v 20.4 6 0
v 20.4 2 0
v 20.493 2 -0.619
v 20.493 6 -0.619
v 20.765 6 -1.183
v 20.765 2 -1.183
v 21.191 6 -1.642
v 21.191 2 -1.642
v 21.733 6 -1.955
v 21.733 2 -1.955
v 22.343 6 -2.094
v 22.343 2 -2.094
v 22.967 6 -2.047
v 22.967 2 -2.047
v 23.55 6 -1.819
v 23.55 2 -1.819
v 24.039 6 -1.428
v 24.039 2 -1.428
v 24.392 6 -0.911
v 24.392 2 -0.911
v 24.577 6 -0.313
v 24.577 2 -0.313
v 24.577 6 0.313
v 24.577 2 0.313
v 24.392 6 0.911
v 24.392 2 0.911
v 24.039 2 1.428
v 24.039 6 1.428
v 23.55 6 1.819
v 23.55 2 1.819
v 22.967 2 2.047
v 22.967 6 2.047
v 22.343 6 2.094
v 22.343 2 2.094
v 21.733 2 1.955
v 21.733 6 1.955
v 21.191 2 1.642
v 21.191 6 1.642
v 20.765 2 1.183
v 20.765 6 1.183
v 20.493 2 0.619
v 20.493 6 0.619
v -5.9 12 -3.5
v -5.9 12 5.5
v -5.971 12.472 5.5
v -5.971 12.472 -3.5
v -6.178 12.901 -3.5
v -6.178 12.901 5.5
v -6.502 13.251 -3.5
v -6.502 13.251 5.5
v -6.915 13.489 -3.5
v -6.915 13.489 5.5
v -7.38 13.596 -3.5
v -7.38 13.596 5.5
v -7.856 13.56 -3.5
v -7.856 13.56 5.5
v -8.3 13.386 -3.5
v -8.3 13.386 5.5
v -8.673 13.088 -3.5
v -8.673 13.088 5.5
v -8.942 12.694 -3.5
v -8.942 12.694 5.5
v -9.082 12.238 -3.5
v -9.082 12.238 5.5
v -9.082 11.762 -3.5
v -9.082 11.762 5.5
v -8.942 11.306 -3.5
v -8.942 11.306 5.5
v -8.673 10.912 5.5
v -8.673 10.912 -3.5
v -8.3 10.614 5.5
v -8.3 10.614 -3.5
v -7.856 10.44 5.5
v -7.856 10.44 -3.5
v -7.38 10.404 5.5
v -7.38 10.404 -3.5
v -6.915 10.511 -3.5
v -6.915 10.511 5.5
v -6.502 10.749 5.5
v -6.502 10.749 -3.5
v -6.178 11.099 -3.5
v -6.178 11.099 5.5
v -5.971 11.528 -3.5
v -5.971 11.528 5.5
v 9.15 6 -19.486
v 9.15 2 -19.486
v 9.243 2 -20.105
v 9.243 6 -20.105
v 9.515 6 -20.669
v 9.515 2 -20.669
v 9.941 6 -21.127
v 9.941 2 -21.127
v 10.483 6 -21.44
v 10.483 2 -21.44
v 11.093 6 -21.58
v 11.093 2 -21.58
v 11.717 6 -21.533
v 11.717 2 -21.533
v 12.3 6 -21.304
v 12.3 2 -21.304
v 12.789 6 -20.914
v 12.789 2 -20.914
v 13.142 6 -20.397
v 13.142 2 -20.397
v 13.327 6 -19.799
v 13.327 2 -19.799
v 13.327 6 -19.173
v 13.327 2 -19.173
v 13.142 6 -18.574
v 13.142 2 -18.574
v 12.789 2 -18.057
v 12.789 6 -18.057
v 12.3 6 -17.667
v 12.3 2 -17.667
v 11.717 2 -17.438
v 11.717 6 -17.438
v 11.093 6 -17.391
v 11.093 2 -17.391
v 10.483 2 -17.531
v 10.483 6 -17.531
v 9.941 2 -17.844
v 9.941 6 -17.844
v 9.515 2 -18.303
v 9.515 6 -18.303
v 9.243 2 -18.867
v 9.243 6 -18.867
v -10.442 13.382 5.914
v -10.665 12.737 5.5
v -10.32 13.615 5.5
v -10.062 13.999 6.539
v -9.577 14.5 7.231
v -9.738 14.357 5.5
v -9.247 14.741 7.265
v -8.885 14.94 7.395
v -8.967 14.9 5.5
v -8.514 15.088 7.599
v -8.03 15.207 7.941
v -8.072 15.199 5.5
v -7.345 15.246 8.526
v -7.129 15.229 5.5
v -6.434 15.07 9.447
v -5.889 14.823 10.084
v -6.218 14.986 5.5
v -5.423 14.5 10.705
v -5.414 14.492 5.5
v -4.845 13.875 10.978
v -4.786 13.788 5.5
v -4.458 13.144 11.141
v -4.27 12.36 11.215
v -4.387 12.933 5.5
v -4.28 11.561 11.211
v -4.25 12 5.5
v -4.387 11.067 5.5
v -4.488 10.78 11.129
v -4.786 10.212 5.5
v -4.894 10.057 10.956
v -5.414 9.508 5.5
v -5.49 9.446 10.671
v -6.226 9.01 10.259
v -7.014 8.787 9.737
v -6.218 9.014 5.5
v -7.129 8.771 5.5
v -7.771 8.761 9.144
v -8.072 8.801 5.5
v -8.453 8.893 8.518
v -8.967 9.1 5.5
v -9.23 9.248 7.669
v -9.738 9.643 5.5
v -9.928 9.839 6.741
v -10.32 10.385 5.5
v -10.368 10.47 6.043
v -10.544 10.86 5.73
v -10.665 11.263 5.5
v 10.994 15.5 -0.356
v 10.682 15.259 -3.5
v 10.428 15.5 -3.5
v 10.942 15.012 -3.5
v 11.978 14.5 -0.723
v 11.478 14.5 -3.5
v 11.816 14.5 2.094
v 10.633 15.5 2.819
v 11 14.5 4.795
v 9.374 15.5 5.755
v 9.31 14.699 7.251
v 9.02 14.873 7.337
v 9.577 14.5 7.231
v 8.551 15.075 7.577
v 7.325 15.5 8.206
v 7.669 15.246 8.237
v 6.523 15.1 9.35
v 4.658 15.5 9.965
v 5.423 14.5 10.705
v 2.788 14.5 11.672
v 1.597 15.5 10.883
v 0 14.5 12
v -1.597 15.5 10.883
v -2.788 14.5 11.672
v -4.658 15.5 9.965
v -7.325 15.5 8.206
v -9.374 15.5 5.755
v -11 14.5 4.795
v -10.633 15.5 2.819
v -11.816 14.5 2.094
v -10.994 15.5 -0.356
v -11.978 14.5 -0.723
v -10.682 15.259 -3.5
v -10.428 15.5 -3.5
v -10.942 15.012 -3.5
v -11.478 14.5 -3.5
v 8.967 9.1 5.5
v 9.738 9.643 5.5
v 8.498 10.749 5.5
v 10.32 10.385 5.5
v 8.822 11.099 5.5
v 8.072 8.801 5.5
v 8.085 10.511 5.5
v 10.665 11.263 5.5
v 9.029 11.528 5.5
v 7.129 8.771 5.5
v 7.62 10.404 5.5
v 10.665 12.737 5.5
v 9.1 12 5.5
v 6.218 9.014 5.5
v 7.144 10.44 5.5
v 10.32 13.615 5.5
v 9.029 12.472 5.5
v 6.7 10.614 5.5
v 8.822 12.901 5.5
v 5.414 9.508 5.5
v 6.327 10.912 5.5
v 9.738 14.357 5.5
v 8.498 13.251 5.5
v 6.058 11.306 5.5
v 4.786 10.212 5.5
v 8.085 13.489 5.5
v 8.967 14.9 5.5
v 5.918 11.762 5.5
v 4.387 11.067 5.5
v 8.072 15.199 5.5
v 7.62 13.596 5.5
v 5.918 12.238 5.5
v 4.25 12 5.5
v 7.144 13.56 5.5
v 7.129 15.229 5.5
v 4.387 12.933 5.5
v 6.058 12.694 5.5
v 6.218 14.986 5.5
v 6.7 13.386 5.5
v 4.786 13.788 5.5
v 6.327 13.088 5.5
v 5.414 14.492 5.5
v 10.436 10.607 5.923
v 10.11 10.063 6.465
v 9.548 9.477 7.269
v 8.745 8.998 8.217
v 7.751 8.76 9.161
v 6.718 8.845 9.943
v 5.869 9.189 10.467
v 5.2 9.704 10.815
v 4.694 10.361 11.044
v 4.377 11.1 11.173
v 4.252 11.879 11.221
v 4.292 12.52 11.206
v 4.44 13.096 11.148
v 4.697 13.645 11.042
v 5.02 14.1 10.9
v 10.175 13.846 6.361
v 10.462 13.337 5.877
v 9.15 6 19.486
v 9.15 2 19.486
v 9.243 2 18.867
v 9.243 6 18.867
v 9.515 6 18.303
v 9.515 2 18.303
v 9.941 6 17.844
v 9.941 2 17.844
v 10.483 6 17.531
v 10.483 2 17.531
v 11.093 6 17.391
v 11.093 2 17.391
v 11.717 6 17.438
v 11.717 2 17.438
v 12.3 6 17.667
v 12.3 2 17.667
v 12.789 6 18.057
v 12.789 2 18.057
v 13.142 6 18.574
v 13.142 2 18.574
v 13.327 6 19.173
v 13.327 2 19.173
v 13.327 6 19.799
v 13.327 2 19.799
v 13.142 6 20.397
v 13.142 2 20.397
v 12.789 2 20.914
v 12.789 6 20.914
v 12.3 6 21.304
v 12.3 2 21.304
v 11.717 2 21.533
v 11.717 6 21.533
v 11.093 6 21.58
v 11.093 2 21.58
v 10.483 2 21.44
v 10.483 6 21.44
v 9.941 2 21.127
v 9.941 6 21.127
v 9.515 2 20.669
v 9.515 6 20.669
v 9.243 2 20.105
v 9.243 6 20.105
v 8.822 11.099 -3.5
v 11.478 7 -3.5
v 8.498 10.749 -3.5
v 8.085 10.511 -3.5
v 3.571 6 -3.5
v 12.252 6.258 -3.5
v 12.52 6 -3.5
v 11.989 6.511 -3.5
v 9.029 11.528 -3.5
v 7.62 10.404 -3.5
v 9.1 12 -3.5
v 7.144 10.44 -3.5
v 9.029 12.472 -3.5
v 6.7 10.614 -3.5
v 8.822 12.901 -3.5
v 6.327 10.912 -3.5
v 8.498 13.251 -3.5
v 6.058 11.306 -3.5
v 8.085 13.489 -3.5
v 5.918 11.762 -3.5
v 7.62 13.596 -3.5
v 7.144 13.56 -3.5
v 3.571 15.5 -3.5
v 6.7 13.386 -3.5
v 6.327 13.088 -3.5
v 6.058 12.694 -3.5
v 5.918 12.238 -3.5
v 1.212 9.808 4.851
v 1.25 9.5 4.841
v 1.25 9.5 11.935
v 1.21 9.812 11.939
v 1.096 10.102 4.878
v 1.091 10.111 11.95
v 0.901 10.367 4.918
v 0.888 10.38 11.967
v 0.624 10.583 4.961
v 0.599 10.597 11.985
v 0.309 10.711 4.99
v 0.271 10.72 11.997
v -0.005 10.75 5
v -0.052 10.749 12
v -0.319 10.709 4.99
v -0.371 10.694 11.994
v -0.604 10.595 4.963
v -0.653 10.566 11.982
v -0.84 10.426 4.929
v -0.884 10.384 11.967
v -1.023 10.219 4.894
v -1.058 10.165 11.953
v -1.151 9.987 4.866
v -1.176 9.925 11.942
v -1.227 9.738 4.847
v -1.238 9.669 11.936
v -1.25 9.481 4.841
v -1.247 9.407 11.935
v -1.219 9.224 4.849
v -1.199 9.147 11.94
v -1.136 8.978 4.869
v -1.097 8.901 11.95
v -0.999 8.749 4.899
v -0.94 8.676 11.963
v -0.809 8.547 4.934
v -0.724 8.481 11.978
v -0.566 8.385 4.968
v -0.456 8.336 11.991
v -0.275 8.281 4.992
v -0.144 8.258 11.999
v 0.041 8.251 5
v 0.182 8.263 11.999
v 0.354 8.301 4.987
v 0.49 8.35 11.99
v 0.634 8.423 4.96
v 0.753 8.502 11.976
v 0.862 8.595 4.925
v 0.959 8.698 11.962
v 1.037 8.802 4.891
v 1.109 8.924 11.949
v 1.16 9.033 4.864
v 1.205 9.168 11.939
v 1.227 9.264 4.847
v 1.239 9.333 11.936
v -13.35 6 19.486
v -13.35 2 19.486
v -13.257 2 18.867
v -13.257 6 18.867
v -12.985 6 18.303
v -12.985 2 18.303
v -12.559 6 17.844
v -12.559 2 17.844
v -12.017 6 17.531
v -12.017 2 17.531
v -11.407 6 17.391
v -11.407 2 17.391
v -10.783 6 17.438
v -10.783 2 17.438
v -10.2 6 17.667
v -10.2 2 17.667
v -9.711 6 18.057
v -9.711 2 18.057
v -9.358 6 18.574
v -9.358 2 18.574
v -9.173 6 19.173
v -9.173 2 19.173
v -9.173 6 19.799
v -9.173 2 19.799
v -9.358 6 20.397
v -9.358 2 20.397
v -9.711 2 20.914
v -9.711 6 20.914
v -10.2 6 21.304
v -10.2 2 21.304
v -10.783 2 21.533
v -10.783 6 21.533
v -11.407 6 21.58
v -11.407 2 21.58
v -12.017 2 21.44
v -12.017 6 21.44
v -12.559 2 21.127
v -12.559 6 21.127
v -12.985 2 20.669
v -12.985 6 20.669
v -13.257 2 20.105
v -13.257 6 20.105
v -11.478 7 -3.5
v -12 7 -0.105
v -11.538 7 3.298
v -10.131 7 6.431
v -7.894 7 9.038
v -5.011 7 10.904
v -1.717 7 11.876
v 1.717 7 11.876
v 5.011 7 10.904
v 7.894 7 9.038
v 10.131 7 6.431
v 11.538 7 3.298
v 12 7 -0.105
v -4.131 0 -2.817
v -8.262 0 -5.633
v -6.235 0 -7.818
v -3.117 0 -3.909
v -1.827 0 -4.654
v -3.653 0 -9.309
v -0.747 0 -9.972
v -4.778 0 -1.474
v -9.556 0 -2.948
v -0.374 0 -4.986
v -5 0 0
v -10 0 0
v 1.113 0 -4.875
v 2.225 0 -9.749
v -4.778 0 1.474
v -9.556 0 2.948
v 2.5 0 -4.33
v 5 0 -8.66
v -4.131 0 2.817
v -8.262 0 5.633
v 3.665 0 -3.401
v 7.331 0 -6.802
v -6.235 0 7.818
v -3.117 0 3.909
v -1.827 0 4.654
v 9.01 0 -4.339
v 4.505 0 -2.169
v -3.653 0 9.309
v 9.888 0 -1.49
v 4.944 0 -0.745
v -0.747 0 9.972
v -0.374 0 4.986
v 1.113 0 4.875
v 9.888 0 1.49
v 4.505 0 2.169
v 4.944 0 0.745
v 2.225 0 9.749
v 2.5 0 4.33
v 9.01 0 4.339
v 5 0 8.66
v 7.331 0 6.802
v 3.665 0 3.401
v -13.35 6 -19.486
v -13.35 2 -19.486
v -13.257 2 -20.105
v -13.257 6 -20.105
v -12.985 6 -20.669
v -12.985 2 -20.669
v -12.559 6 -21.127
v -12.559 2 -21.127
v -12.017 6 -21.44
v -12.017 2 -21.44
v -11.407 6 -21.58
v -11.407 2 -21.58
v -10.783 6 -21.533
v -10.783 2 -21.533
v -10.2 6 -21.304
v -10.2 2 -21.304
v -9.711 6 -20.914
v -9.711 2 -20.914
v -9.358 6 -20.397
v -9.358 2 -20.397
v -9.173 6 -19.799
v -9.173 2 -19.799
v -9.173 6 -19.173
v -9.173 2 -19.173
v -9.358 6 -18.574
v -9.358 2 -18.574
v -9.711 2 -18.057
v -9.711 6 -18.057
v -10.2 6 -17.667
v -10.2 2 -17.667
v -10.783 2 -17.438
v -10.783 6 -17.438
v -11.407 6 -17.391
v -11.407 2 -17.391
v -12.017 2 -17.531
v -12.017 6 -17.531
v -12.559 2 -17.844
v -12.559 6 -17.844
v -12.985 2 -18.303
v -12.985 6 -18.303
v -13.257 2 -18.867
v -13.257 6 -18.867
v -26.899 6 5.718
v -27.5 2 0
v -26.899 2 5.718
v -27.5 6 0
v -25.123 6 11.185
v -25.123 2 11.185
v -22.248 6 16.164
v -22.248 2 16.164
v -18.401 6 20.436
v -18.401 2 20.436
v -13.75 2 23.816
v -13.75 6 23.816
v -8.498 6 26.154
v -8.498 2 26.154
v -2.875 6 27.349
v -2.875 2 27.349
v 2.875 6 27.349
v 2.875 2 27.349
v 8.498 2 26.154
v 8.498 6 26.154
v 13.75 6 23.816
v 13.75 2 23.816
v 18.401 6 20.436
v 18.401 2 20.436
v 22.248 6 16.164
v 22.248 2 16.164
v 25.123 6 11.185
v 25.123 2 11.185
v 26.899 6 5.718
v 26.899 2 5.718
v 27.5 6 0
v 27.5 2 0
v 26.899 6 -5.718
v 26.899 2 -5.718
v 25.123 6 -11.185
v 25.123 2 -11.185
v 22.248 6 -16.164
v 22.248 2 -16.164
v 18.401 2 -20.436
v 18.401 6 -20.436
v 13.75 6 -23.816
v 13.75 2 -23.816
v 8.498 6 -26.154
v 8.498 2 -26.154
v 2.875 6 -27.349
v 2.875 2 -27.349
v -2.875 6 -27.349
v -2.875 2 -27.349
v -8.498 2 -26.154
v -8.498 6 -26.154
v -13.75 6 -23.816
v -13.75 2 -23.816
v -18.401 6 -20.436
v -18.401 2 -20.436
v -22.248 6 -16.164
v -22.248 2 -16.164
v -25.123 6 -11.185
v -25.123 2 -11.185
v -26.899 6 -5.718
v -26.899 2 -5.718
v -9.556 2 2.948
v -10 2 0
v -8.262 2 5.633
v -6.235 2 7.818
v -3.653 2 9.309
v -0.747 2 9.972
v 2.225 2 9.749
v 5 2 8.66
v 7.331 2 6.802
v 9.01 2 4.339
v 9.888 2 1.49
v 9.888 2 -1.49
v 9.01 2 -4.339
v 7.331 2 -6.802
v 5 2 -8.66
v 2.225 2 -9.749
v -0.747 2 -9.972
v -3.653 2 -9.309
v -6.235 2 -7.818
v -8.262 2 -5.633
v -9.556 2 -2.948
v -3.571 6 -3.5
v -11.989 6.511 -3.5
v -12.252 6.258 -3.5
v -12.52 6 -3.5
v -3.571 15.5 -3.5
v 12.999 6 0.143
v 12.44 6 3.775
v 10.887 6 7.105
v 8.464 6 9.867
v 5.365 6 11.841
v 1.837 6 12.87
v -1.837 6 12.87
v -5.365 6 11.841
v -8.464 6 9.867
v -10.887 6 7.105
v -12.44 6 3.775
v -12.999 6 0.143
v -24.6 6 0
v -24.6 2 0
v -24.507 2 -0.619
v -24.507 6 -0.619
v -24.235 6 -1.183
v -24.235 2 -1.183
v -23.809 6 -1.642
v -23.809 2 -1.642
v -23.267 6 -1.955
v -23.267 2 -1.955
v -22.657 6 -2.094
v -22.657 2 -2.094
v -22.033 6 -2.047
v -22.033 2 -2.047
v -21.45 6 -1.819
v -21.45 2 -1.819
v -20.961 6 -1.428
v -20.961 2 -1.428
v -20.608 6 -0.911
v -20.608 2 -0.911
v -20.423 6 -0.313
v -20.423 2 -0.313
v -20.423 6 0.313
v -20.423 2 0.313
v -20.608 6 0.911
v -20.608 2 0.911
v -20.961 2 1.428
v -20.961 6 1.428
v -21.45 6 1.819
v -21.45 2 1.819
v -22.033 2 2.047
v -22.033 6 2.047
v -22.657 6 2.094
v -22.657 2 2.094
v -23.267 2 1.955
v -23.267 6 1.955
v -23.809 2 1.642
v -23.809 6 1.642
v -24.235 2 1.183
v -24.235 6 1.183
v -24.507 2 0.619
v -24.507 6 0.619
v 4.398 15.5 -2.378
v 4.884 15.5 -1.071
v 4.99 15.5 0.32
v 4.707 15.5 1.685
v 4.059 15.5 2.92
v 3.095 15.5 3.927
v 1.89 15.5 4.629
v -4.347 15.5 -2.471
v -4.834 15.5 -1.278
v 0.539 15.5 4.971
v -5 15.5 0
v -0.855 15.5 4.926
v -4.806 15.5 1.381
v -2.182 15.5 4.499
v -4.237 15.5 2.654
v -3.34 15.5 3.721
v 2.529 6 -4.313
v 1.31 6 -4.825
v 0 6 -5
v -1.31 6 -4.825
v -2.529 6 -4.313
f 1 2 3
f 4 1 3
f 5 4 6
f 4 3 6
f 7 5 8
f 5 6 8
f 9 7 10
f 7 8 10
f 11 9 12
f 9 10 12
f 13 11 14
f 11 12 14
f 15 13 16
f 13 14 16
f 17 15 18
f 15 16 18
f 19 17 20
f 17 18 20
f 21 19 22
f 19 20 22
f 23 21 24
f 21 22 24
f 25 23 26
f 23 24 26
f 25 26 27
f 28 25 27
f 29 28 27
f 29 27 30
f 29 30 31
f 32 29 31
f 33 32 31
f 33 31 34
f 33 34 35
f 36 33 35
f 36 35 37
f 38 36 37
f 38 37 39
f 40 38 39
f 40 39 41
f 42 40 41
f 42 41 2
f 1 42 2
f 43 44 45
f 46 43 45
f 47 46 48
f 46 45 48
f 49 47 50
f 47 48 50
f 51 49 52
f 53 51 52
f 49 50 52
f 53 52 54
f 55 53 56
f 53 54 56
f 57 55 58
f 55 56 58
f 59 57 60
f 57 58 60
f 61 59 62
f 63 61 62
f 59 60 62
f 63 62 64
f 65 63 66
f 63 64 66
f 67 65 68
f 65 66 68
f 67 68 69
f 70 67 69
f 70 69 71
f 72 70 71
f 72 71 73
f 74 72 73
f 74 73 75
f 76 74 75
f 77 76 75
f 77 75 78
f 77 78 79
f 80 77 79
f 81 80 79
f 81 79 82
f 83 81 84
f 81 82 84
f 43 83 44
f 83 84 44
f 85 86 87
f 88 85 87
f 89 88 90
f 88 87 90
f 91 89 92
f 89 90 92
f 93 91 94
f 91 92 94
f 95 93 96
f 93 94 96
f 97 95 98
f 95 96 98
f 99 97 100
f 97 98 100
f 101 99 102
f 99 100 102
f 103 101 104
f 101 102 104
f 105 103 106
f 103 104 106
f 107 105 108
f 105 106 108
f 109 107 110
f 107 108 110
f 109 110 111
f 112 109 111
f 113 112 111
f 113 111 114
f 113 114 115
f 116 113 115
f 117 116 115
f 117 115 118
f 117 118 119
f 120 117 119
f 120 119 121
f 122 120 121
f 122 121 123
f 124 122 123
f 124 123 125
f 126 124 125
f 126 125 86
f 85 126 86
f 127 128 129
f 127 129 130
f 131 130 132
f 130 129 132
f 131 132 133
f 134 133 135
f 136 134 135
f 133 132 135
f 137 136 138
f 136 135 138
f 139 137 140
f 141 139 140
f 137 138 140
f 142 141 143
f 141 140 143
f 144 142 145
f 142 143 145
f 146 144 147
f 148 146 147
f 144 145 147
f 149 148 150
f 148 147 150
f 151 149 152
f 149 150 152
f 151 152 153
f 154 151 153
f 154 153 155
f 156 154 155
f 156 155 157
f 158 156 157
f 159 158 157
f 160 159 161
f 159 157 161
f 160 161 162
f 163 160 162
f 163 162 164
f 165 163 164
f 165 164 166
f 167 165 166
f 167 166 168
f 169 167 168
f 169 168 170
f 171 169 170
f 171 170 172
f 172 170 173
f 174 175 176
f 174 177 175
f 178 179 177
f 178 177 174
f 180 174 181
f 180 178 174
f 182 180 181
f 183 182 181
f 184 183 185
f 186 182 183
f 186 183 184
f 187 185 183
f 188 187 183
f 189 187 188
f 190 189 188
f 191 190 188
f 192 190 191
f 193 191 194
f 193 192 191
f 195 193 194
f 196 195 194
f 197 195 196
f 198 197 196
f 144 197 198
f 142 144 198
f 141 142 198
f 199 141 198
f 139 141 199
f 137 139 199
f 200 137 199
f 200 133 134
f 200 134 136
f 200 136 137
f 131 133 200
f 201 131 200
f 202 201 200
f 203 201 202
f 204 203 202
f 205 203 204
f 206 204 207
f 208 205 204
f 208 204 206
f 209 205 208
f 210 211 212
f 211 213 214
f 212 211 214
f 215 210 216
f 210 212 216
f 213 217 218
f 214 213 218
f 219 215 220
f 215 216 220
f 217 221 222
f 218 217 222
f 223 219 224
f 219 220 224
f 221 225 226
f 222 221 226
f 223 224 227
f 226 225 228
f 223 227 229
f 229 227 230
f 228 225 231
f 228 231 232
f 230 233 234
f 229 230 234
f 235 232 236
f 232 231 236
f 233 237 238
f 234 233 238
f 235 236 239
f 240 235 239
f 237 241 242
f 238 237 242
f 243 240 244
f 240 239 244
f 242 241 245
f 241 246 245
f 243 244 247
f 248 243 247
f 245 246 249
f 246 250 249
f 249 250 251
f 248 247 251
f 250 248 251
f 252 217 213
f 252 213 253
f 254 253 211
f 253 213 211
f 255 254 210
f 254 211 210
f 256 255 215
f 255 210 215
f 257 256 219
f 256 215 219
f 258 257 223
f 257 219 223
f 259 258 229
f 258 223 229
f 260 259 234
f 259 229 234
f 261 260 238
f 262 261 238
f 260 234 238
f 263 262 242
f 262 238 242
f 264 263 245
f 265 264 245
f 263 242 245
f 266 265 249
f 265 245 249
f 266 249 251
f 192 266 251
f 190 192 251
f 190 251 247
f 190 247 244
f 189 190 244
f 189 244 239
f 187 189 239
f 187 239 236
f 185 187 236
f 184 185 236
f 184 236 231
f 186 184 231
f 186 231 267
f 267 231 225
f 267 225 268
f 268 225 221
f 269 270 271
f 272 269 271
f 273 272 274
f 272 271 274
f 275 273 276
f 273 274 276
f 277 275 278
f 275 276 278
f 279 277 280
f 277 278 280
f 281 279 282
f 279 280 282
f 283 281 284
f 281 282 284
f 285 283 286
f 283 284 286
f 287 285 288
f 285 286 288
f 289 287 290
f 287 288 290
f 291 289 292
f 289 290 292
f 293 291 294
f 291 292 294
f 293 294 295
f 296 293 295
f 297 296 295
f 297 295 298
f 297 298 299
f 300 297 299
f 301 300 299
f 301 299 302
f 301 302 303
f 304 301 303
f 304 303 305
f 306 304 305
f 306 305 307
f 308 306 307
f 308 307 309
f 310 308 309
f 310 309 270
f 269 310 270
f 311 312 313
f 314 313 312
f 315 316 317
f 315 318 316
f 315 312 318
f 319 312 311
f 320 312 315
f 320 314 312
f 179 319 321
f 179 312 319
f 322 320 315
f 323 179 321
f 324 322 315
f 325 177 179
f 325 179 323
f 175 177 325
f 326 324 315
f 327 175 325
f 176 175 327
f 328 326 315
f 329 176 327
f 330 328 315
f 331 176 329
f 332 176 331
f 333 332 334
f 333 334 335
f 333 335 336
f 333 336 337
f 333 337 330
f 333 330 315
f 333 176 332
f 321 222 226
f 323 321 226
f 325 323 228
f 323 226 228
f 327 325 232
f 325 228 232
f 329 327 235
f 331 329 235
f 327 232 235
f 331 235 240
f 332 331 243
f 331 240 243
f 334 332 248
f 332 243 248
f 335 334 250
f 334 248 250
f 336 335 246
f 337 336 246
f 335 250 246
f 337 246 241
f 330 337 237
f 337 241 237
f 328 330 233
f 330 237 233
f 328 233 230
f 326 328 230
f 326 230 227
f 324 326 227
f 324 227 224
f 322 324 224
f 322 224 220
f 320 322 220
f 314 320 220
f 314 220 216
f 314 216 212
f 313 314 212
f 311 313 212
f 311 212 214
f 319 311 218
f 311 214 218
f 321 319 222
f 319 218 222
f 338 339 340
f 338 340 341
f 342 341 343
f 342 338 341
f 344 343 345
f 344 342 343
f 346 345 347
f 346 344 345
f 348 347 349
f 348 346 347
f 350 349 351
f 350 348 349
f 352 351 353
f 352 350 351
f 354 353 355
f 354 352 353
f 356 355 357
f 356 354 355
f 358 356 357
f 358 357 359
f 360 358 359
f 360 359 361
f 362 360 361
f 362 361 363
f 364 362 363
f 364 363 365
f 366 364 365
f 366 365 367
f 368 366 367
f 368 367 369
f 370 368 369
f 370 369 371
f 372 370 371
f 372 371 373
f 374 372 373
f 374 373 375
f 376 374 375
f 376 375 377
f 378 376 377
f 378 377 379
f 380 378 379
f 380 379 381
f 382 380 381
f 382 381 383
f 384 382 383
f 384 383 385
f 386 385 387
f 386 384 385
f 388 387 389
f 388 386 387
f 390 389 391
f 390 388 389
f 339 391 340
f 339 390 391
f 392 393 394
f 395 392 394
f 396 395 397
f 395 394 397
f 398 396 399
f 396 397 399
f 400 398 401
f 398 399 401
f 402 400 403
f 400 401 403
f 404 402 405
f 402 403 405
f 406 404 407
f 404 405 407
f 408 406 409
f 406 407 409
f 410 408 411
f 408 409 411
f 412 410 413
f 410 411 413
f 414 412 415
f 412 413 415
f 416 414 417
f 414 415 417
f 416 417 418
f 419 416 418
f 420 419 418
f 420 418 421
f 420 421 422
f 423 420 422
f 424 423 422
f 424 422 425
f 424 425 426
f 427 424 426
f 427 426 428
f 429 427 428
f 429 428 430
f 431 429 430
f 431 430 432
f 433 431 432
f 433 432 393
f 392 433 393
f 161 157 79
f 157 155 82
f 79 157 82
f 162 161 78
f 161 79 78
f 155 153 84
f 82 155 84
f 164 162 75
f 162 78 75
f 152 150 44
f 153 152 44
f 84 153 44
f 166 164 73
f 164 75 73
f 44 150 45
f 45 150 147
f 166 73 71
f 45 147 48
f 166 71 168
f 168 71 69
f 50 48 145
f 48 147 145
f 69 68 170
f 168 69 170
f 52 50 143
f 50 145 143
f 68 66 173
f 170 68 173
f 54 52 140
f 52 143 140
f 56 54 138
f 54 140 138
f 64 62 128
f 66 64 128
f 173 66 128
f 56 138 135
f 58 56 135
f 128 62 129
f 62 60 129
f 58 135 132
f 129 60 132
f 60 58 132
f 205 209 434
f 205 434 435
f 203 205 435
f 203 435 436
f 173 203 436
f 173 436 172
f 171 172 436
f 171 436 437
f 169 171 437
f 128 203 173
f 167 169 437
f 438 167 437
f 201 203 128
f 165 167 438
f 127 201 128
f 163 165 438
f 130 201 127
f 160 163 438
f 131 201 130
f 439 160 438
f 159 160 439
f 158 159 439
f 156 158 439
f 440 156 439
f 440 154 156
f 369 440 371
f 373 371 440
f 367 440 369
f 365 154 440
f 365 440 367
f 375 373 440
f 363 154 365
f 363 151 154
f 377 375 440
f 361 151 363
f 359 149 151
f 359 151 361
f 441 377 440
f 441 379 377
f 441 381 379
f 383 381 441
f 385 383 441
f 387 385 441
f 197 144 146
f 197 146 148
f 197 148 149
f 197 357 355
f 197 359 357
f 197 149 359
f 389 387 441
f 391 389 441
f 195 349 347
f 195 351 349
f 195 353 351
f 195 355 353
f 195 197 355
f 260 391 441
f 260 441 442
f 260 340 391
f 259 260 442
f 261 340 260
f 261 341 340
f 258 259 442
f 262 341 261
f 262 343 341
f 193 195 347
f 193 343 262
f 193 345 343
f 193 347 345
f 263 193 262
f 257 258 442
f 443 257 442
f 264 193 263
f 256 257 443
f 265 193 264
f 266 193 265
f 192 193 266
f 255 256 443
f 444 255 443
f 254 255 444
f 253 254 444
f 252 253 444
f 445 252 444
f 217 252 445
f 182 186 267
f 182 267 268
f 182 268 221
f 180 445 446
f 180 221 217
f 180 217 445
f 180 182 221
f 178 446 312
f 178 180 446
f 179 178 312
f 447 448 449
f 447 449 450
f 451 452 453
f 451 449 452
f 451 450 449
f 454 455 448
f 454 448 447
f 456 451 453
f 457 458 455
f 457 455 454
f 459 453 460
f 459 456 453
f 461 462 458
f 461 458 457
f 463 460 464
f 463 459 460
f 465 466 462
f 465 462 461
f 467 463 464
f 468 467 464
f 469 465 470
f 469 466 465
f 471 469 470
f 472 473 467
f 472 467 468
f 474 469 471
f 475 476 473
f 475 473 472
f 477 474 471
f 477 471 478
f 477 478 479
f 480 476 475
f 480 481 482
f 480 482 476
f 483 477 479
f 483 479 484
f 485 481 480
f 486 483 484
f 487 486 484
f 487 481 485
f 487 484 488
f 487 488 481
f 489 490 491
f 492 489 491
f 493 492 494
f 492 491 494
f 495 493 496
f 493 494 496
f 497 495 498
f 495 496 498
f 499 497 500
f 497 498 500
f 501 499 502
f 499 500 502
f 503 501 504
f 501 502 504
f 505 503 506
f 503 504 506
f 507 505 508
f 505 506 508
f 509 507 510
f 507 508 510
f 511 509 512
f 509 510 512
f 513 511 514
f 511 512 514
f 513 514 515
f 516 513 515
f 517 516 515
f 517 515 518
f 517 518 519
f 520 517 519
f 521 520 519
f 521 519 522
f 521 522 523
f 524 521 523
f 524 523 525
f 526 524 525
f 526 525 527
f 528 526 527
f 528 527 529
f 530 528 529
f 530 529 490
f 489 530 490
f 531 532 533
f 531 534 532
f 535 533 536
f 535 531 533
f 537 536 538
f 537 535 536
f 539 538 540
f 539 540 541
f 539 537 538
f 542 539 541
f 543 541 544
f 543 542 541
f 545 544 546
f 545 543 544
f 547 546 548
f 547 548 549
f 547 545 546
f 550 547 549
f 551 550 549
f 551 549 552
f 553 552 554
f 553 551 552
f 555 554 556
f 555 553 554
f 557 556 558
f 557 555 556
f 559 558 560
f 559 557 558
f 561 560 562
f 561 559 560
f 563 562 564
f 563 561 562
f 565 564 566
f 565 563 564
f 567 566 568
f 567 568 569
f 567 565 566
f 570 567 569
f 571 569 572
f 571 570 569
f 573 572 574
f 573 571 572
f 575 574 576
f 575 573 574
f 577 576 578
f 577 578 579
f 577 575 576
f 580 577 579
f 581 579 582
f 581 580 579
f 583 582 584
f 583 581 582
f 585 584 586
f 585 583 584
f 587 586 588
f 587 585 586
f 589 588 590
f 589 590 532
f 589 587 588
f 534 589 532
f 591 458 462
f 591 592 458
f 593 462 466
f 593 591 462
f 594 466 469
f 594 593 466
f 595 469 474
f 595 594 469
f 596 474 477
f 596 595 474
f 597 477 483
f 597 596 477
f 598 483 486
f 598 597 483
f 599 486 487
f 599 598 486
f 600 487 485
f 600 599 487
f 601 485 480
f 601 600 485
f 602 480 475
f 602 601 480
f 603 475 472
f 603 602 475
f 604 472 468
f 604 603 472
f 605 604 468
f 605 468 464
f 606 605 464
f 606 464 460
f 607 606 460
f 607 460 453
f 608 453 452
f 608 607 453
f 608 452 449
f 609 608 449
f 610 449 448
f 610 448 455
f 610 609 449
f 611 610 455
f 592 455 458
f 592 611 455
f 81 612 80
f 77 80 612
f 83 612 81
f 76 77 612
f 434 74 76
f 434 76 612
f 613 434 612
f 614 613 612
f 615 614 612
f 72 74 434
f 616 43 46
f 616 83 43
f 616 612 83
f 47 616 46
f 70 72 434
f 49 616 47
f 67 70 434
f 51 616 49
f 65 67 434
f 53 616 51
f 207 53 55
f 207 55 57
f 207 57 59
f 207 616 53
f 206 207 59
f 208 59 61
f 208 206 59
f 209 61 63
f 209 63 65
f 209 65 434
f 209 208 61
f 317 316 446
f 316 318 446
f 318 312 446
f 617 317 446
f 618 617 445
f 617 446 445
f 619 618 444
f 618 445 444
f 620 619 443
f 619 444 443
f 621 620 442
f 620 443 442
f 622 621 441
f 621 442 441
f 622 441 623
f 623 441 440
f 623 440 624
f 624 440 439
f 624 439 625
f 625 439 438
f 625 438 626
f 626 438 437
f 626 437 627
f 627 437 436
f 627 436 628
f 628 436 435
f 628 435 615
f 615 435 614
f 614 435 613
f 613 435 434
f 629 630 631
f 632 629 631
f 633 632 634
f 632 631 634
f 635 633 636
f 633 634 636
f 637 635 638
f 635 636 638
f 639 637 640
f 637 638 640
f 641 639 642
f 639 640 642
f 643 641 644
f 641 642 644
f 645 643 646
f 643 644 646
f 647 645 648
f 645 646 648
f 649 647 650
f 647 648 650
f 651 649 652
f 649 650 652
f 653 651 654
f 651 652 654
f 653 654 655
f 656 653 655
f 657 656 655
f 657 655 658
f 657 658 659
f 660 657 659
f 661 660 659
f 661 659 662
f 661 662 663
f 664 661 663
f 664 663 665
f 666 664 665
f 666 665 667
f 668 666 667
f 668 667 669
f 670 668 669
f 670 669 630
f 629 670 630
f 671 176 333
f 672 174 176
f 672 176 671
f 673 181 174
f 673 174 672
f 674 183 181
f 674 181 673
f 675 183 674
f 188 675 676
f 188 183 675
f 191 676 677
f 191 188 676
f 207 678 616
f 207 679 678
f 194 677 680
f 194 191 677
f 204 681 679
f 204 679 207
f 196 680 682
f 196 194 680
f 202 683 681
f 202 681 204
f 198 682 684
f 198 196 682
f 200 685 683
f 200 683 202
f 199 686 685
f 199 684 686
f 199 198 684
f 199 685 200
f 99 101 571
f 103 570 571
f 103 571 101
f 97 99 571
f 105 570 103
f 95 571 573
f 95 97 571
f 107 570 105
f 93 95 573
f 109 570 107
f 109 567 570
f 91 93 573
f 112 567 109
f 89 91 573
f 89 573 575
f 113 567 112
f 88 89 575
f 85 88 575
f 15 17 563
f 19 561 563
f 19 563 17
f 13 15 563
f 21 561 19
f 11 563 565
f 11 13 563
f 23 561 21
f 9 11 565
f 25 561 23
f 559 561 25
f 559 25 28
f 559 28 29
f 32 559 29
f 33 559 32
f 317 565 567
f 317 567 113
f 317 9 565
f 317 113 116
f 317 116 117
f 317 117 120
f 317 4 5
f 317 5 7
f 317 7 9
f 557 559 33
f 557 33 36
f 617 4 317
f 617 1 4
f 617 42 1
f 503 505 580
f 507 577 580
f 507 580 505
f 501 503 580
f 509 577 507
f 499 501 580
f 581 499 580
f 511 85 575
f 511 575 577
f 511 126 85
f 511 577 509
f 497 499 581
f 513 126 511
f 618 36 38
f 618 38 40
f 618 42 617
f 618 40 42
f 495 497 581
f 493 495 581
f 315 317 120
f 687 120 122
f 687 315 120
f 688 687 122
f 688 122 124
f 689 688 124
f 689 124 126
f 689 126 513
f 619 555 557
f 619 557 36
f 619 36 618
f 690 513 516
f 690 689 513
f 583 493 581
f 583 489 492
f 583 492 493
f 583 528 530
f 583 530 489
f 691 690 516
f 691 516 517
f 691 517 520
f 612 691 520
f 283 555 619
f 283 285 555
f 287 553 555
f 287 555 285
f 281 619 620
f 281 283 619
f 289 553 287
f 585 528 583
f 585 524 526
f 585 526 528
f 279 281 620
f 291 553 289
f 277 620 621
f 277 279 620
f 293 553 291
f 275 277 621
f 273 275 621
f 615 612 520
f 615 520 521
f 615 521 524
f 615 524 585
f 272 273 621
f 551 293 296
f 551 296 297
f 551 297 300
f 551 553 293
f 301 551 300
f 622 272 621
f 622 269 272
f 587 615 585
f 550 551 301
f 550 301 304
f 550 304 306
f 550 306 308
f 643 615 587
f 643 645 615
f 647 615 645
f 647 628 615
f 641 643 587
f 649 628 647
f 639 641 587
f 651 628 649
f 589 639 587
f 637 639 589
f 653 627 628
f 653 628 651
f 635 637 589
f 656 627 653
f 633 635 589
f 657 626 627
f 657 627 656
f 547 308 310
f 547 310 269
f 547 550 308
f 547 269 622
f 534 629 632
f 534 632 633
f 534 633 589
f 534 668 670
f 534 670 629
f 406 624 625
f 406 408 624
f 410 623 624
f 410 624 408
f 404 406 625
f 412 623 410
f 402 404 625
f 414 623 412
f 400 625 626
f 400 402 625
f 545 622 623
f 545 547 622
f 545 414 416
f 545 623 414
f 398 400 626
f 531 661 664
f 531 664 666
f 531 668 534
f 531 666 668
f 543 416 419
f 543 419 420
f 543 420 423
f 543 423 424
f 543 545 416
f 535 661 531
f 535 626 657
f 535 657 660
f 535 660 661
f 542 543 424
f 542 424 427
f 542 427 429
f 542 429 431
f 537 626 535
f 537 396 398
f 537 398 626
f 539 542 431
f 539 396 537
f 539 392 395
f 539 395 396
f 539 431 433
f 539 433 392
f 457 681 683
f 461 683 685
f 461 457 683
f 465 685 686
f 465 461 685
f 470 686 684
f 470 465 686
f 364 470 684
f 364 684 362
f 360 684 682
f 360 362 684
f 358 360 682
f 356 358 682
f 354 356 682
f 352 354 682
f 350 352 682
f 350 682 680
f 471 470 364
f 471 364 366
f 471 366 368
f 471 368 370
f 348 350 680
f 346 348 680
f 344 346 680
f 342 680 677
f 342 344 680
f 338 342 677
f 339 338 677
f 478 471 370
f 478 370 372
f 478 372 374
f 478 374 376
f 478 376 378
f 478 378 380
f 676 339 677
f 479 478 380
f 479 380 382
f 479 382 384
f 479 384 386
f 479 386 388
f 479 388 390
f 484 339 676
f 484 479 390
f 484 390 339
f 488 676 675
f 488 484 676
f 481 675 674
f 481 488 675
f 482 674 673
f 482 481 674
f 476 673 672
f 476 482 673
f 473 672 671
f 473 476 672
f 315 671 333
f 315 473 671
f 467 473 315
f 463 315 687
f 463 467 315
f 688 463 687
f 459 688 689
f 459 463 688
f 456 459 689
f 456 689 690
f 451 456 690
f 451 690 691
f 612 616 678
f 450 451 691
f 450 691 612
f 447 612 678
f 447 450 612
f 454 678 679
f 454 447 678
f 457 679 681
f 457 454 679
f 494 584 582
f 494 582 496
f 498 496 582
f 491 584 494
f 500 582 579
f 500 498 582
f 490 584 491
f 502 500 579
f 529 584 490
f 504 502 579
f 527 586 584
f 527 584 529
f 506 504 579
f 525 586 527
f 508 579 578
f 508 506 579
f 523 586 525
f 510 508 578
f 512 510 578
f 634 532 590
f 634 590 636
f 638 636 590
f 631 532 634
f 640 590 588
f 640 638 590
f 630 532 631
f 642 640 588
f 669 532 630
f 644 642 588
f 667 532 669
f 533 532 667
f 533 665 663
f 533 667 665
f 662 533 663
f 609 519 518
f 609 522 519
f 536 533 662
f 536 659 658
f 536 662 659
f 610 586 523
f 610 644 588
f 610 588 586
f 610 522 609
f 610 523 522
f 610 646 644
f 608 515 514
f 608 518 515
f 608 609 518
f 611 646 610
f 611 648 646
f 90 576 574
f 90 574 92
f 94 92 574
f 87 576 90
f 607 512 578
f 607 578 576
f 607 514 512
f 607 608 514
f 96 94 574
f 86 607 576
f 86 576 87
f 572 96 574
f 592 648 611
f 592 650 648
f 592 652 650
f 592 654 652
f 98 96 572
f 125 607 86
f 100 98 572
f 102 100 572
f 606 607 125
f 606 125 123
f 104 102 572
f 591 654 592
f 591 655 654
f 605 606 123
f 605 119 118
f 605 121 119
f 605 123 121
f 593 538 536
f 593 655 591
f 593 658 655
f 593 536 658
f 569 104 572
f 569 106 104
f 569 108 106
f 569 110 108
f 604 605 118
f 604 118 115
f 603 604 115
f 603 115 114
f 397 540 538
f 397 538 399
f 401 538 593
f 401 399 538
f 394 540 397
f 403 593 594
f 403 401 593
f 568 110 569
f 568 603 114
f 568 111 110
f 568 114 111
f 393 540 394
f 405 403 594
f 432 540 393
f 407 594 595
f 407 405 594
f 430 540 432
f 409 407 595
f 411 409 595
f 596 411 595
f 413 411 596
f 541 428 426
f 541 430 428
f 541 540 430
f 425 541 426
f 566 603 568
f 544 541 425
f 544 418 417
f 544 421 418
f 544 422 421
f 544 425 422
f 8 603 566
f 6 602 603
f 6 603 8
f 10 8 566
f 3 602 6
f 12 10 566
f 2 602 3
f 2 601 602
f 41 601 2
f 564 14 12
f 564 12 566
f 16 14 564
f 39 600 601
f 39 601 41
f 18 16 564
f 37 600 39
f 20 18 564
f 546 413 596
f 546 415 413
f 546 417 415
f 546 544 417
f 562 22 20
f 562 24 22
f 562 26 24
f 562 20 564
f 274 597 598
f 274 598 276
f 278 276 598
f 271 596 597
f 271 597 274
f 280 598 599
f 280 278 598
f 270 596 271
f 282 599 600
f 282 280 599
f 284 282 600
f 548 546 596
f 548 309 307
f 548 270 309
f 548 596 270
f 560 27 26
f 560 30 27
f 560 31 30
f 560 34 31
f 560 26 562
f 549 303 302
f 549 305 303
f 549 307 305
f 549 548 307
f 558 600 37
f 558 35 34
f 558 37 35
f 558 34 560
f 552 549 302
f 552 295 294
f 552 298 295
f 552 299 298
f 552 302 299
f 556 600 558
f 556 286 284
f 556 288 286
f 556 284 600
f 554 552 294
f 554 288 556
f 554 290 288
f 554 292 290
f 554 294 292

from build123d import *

# Parameters (mm, degrees)
SKETCH_2_R               = 1
CUT_EXTRUDE_2_DEPTH      = 10
CUT_EXTRUDE_4_DEPTH      = 9.5
CHAMFER_1_SIZE           = 1
SKETCH_3_R               = 1.25
SKETCH_3_R_2             = 1.6
CUT_EXTRUDE_3_DEPTH      = 28.5
CUT_EXTRUDE_3_DEPTH_BACK = 28.5
SKETCH_7_R               = 3.25
CUT_EXTRUDE_5_DEPTH      = 23
HOLE_WIZARD_M5_1_D       = 4.2


with BuildPart() as part:
    # 草图1 → 旋转1 (revolve)
    with BuildSketch(Plane.XY):
        Polygon((-10, 2), (-27.5, 2), (-27.5, 6), (-12, 6), (-12, 15.5), (-5, 15.5), (-5, 0), (-10, 0), align=None)
    revolve(axis=Axis((0, 0, 0), (0, 1, 0)))

    # 草图2 → 切除-拉伸2 (cut)
    with BuildSketch(Plane.XZ.offset(-2)):
        with Locations((-11.25, 19.485571585)):
            Circle(SKETCH_2_R)
        with Locations((11.25, 19.485571585)):
            Circle(SKETCH_2_R)
        with Locations((22.5, 0)):
            Circle(SKETCH_2_R)
        with Locations((11.25, -19.485571585)):
            Circle(SKETCH_2_R)
        with Locations((-11.25, -19.485571585)):
            Circle(SKETCH_2_R)
        with Locations((-22.5, 0)):
            Circle(SKETCH_2_R)
    extrude(amount=-CUT_EXTRUDE_2_DEPTH, mode=Mode.SUBTRACT)

    # 草图6 → 切除-拉伸4 (cut)
    with BuildSketch(Plane.XZ.offset(-15.5)):
        with BuildLine():
            Line((11.478240283, -3.5), (-11.478240283, -3.5))
            ThreePointArc((-11.478240283, -3.5), (0, -12), (11.478240283, -3.5))
        make_face()
    extrude(amount=CUT_EXTRUDE_4_DEPTH, mode=Mode.SUBTRACT)

    # 倒角1
    chamfer_1_edges = [part.edges().sort_by_distance(p)[0] for p in [
        (0, 15.5, 12),
        (0, 6, 12),
    ]]
    chamfer(chamfer_1_edges, length=CHAMFER_1_SIZE)

    # 草图3 → 切除-拉伸3 (cut, two sides)
    with BuildSketch(Plane.XY) as cut_extrude_3_sk:
        with Locations((0, 9.5)):
            Circle(SKETCH_3_R)
        with Locations((7.5, 12)):
            Circle(SKETCH_3_R_2)
        with Locations((-7.5, 12)):
            Circle(SKETCH_3_R_2)
    extrude(amount=CUT_EXTRUDE_3_DEPTH, mode=Mode.SUBTRACT)
    extrude(cut_extrude_3_sk.sketch, amount=-CUT_EXTRUDE_3_DEPTH_BACK, mode=Mode.SUBTRACT)

    # 草图7 → 切除-拉伸5 (cut, through all)
    with BuildSketch(Plane(origin=(0, 0, 5.5), x_dir=(-1, 0, 0), z_dir=(0, 0, -1))):
        with Locations((-7.5, 12)):
            Circle(SKETCH_7_R)
        with Locations((7.5, 12)):
            Circle(SKETCH_7_R)
    extrude(amount=-CUT_EXTRUDE_5_DEPTH, mode=Mode.SUBTRACT)

    # M5 螺纹孔1 (through all)
    with Locations(Plane(origin=(0, 6, 0), x_dir=(1, 0, 0), z_dir=(0, 1, 0))):
        with Locations((11.25, 19.485571585), (22.5, 0), (11.25, -19.485571585), (-11.25, -19.485571585), (-22.5, 0), (-11.25, 19.485571585)):
            Hole(HOLE_WIZARD_M5_1_D / 2)


solid = part.part
